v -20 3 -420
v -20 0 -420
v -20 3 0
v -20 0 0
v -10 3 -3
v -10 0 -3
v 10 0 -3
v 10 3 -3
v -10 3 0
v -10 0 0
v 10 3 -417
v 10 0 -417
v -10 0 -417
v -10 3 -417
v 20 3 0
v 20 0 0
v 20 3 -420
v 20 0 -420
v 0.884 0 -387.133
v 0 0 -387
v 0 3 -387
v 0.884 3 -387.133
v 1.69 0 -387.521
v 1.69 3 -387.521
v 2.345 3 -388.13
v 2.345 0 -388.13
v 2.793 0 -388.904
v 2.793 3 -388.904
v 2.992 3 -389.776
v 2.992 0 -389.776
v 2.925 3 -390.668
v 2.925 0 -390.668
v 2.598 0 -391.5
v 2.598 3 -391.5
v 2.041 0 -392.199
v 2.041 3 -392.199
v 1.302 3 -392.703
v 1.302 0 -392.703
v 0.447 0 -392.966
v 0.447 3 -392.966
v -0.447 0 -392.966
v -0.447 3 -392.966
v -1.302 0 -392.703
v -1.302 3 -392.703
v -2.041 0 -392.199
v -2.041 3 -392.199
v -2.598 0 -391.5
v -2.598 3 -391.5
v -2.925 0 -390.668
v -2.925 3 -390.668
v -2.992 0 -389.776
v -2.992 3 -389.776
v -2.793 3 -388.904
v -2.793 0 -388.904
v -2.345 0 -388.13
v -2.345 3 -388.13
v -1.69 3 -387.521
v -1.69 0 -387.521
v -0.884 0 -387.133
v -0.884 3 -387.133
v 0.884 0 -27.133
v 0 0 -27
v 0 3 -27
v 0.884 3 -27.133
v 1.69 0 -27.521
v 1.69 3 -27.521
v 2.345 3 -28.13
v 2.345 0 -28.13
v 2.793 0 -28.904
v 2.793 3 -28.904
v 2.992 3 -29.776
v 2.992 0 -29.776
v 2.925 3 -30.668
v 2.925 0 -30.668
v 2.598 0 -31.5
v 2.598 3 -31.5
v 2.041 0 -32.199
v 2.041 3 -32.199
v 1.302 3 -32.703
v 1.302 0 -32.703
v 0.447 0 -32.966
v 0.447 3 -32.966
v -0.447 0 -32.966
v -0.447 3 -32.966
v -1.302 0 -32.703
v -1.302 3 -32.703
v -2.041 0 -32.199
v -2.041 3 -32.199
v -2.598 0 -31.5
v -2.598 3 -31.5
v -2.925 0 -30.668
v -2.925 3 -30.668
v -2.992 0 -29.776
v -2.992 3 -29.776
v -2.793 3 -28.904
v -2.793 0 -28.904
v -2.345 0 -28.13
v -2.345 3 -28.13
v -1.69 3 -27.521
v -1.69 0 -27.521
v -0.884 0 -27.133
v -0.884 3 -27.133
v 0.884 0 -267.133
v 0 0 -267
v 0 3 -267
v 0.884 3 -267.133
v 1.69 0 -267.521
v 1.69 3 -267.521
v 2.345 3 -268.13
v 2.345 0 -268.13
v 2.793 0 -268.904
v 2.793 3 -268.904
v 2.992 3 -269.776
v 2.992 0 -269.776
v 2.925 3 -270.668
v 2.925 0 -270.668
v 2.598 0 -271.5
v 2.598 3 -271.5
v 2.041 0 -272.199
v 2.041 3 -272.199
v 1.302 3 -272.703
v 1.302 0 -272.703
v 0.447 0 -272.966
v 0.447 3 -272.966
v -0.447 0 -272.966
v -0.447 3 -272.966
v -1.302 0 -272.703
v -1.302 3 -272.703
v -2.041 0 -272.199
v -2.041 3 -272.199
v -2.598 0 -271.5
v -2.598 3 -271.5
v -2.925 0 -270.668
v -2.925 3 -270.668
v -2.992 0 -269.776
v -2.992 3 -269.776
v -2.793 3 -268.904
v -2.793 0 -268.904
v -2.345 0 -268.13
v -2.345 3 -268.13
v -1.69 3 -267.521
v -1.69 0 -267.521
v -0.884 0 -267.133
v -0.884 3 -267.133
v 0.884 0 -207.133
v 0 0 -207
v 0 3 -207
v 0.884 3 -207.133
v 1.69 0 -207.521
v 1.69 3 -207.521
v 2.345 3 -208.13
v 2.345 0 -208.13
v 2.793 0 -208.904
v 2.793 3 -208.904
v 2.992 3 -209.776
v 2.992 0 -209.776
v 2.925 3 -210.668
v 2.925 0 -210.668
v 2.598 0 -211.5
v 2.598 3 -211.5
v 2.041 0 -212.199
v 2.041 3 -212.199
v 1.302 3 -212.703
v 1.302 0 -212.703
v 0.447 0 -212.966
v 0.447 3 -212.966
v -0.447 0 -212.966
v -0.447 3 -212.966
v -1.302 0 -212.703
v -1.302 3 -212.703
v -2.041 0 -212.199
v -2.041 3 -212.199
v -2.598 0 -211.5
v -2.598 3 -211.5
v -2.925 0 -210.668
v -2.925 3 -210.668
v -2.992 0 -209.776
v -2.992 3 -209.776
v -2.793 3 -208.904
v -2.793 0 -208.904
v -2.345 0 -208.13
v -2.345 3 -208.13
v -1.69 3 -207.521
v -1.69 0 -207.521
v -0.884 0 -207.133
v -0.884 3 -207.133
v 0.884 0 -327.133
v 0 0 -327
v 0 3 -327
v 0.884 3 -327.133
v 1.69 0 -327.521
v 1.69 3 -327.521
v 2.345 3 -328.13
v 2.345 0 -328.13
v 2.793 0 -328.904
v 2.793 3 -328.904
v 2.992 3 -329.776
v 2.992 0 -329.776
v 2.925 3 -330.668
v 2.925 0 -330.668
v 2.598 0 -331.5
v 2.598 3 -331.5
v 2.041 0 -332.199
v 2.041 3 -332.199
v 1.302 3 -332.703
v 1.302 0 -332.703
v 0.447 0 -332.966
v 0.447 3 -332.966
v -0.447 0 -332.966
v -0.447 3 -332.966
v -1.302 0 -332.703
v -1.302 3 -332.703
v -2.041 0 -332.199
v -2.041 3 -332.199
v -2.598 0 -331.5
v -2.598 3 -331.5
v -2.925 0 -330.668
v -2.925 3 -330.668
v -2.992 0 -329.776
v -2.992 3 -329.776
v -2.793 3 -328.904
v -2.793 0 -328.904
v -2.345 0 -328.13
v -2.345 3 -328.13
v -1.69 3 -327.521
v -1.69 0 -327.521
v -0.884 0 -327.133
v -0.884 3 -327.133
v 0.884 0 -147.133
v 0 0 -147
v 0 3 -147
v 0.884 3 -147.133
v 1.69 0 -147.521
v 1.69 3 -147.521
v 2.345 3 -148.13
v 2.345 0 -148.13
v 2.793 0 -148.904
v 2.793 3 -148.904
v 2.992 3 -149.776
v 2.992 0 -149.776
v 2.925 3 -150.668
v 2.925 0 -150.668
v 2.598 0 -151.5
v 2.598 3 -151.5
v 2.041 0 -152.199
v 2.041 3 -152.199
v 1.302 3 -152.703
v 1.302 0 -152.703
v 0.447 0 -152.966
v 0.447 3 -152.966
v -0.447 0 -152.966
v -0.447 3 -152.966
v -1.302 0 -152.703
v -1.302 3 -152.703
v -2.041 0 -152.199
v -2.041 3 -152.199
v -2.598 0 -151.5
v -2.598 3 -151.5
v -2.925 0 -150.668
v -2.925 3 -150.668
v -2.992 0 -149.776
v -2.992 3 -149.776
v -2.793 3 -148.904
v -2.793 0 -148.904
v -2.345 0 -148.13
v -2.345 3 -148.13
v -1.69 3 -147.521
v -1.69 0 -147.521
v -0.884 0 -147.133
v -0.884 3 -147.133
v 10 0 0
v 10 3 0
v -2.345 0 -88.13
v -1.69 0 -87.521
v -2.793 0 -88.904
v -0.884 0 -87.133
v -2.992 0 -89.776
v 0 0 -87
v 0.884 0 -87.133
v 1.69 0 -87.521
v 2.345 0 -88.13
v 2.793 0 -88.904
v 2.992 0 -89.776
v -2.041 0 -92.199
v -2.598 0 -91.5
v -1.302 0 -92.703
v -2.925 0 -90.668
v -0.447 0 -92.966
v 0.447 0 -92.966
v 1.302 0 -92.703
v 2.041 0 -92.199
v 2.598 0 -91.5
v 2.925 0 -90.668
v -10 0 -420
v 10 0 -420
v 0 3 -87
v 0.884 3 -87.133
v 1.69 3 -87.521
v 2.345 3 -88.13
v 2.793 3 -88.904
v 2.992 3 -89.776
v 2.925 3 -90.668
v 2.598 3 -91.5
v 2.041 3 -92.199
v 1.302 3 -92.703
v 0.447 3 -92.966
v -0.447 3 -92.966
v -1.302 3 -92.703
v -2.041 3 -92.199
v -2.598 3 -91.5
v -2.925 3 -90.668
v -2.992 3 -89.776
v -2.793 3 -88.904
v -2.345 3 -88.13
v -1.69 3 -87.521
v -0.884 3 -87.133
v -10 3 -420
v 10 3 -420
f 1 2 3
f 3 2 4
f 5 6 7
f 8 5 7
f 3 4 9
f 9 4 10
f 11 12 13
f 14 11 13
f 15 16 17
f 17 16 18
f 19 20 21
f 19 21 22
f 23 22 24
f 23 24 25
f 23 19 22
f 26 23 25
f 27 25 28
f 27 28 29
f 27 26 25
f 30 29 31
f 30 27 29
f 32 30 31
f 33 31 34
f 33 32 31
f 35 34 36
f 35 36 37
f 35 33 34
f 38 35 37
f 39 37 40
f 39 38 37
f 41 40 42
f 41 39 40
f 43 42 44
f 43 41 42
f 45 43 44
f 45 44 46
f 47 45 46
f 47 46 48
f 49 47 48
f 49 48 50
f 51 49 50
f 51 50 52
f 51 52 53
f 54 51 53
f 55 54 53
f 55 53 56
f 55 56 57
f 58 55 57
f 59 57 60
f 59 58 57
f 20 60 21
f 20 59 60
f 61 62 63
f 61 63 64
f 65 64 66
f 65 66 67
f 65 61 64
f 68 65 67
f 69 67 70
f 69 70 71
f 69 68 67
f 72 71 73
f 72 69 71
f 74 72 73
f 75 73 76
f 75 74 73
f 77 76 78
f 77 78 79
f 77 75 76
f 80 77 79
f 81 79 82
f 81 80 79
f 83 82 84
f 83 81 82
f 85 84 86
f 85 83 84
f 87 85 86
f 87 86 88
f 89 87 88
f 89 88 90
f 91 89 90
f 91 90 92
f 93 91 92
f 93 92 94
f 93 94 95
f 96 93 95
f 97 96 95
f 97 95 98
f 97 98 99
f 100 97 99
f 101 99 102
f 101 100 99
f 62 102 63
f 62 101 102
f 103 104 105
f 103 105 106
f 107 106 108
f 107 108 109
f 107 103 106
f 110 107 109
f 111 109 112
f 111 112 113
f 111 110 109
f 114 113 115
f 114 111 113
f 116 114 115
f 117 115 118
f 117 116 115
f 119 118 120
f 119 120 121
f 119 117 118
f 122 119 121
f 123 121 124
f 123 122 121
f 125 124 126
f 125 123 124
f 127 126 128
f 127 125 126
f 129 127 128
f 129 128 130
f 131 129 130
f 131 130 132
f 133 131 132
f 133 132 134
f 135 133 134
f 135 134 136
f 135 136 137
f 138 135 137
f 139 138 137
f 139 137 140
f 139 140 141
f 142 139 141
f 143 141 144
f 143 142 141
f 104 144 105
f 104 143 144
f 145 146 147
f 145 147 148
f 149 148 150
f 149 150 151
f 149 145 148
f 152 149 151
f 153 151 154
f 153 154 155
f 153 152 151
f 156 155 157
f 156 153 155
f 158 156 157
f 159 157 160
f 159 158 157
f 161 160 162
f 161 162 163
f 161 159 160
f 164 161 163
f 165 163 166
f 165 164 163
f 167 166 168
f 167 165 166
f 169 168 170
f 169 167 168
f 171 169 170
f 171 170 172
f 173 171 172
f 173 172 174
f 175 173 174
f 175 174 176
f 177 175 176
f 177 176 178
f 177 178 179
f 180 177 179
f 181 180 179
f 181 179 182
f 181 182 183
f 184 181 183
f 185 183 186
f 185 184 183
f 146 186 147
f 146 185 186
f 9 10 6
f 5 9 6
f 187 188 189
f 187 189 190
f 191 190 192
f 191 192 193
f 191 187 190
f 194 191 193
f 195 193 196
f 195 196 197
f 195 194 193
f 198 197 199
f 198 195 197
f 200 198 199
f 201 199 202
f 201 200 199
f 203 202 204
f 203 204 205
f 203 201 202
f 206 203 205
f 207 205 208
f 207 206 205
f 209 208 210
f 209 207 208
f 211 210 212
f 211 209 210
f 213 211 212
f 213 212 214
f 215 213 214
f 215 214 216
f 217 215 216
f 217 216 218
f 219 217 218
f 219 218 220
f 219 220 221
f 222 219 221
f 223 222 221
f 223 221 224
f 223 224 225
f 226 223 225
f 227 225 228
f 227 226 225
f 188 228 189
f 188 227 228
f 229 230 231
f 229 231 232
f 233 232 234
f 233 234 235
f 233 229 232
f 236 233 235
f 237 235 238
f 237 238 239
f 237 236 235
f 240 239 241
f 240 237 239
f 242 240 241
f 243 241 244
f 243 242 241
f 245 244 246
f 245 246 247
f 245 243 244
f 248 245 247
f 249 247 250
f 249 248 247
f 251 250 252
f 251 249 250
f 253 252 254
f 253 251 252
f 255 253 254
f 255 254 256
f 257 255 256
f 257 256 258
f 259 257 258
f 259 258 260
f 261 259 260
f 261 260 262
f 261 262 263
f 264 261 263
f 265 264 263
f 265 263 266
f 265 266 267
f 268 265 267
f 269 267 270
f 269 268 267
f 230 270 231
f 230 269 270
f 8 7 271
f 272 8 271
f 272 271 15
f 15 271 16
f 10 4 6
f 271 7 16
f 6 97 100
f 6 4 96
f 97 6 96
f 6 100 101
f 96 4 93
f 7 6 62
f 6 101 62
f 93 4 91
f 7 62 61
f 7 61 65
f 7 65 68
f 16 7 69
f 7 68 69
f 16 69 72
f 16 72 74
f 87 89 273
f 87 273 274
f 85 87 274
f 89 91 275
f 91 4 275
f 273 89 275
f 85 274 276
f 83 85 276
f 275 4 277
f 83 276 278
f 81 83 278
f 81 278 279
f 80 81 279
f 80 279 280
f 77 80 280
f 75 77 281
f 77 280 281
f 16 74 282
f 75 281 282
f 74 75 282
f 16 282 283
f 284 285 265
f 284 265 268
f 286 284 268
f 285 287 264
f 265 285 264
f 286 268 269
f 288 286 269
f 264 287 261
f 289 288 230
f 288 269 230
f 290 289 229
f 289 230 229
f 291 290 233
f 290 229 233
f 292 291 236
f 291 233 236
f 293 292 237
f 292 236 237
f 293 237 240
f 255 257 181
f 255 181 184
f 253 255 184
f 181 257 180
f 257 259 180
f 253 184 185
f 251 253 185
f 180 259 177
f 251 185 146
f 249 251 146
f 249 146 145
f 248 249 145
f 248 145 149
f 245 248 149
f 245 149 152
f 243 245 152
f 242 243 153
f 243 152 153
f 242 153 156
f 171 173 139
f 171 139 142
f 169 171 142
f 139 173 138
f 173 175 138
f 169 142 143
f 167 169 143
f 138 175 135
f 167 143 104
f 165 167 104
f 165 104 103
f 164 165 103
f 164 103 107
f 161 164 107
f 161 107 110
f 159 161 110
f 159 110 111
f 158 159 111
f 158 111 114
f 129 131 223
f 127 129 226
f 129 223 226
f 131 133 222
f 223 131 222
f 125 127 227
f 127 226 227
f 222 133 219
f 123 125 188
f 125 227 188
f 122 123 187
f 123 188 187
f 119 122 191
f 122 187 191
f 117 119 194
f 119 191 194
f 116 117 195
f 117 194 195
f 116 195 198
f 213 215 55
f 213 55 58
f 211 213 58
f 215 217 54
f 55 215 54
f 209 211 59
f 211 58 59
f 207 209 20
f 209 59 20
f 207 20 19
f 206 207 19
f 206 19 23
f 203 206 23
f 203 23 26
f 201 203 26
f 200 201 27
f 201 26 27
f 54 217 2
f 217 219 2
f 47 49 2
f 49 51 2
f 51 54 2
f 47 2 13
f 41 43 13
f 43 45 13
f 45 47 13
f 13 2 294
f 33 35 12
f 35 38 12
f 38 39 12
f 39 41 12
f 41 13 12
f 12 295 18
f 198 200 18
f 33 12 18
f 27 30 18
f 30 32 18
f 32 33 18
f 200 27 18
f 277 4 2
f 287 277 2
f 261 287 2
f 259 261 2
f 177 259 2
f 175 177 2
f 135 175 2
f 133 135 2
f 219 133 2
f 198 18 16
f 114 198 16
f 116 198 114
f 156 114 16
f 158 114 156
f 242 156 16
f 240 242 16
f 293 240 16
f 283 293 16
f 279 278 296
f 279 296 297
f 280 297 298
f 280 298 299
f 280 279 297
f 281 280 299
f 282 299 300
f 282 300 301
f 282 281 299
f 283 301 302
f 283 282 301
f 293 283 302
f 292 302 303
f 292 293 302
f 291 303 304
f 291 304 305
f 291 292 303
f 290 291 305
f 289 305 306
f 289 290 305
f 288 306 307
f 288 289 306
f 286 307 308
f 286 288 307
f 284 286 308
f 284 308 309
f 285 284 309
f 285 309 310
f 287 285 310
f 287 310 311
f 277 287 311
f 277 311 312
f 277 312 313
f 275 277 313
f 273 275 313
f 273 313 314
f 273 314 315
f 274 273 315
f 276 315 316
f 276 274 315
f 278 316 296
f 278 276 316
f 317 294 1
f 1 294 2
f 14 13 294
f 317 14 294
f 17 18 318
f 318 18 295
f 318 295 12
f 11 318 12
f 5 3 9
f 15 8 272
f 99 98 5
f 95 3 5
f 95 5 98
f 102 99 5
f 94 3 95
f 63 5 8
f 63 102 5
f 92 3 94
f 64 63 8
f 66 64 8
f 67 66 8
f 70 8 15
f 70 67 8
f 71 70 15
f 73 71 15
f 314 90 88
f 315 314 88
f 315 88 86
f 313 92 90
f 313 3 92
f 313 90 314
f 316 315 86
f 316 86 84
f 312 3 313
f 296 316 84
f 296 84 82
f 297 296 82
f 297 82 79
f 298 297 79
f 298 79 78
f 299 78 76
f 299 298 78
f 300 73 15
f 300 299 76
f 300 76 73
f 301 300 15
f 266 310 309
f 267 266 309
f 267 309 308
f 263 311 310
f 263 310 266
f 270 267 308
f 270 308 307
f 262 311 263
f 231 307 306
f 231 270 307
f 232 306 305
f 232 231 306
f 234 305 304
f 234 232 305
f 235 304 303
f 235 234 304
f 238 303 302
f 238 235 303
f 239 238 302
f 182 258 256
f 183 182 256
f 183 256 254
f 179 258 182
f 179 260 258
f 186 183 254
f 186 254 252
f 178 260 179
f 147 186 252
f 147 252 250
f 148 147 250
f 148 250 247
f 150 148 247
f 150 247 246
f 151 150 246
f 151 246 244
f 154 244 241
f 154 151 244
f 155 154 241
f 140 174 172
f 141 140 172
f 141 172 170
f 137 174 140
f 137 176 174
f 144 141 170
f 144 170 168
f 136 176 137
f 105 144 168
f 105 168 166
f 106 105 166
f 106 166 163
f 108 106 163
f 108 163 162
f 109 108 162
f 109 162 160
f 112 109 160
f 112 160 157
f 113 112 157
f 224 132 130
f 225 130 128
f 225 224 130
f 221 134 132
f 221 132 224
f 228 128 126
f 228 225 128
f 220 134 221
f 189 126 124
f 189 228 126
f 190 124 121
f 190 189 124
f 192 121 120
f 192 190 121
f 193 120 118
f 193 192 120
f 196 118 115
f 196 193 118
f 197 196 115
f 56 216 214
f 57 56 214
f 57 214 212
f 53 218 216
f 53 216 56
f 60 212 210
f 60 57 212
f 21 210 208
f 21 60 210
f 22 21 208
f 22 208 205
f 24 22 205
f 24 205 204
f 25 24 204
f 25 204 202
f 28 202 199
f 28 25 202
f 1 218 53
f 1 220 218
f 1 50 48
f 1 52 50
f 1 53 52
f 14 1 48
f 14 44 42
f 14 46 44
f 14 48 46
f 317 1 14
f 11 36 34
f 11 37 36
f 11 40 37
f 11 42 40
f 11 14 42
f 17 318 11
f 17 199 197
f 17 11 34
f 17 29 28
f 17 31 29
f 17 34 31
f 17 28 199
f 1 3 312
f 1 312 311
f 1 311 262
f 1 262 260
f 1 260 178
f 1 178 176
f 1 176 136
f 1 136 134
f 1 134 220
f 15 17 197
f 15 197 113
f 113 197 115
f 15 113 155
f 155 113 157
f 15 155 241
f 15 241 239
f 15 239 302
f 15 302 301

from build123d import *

# Parameters (mm, degrees)
SKETCH1_R           = 3
BOSS_EXTRUDE1_DEPTH = 3


with BuildPart() as part:
    # Sketch1 → Boss-Extrude1 (new body)
    with BuildSketch(Plane(origin=(0, 0, 0), x_dir=(1, 0, 0), z_dir=(0, 1, 0))):
        Polygon((-20, 420), (-20, 0), (-10, 0), (-10, 3), (10, 3), (10, 0), (20, 0), (20, 420), (10, 420), (10, 417), (-10, 417), (-10, 420), align=None)
        with Locations(Location((0, 90, 0), (0, 0, 270))):
            Circle(SKETCH1_R, mode=Mode.SUBTRACT)
        with Locations(Location((0, 150, 0), (0, 0, 270))):
            Circle(SKETCH1_R, mode=Mode.SUBTRACT)
        with Locations(Location((0, 30, 0), (0, 0, 270))):
            Circle(SKETCH1_R, mode=Mode.SUBTRACT)
        with Locations(Location((0, 210, 0), (0, 0, 270))):
            Circle(SKETCH1_R, mode=Mode.SUBTRACT)
        with Locations(Location((0, 270, 0), (0, 0, 270))):
            Circle(SKETCH1_R, mode=Mode.SUBTRACT)
        with Locations(Location((0, 330, 0), (0, 0, 270))):
            Circle(SKETCH1_R, mode=Mode.SUBTRACT)
        with Locations(Location((0, 390, 0), (0, 0, 270))):
            Circle(SKETCH1_R, mode=Mode.SUBTRACT)
    extrude(amount=BOSS_EXTRUDE1_DEPTH)


solid = part.part
